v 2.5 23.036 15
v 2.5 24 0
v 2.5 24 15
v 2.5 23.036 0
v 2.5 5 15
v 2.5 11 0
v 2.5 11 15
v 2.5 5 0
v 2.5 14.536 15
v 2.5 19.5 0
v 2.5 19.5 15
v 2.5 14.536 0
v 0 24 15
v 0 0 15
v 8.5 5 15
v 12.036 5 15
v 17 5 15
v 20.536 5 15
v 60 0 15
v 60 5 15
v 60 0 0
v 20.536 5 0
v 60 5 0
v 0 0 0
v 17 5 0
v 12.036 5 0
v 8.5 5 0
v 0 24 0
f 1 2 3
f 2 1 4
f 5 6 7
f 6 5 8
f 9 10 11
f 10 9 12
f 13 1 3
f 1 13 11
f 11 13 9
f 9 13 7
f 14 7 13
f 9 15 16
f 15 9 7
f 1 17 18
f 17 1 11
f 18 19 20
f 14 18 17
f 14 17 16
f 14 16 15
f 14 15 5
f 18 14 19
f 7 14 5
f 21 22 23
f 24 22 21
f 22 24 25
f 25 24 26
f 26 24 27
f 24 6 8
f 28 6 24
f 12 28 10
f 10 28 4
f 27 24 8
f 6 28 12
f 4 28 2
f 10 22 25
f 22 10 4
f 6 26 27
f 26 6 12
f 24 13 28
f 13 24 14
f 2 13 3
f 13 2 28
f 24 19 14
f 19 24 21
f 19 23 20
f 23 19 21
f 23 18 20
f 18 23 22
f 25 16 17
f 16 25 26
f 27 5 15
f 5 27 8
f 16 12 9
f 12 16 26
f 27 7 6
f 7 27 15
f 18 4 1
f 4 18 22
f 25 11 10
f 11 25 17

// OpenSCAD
cube([2.5,24,15]);
cube([60,5,15]);
translate([0,13.5,0]) rotate([0,0,-45]) cube([15,2.5,15]);
translate([0,22,0]) rotate([0,0,-45]) cube([27,2.5,15]);
